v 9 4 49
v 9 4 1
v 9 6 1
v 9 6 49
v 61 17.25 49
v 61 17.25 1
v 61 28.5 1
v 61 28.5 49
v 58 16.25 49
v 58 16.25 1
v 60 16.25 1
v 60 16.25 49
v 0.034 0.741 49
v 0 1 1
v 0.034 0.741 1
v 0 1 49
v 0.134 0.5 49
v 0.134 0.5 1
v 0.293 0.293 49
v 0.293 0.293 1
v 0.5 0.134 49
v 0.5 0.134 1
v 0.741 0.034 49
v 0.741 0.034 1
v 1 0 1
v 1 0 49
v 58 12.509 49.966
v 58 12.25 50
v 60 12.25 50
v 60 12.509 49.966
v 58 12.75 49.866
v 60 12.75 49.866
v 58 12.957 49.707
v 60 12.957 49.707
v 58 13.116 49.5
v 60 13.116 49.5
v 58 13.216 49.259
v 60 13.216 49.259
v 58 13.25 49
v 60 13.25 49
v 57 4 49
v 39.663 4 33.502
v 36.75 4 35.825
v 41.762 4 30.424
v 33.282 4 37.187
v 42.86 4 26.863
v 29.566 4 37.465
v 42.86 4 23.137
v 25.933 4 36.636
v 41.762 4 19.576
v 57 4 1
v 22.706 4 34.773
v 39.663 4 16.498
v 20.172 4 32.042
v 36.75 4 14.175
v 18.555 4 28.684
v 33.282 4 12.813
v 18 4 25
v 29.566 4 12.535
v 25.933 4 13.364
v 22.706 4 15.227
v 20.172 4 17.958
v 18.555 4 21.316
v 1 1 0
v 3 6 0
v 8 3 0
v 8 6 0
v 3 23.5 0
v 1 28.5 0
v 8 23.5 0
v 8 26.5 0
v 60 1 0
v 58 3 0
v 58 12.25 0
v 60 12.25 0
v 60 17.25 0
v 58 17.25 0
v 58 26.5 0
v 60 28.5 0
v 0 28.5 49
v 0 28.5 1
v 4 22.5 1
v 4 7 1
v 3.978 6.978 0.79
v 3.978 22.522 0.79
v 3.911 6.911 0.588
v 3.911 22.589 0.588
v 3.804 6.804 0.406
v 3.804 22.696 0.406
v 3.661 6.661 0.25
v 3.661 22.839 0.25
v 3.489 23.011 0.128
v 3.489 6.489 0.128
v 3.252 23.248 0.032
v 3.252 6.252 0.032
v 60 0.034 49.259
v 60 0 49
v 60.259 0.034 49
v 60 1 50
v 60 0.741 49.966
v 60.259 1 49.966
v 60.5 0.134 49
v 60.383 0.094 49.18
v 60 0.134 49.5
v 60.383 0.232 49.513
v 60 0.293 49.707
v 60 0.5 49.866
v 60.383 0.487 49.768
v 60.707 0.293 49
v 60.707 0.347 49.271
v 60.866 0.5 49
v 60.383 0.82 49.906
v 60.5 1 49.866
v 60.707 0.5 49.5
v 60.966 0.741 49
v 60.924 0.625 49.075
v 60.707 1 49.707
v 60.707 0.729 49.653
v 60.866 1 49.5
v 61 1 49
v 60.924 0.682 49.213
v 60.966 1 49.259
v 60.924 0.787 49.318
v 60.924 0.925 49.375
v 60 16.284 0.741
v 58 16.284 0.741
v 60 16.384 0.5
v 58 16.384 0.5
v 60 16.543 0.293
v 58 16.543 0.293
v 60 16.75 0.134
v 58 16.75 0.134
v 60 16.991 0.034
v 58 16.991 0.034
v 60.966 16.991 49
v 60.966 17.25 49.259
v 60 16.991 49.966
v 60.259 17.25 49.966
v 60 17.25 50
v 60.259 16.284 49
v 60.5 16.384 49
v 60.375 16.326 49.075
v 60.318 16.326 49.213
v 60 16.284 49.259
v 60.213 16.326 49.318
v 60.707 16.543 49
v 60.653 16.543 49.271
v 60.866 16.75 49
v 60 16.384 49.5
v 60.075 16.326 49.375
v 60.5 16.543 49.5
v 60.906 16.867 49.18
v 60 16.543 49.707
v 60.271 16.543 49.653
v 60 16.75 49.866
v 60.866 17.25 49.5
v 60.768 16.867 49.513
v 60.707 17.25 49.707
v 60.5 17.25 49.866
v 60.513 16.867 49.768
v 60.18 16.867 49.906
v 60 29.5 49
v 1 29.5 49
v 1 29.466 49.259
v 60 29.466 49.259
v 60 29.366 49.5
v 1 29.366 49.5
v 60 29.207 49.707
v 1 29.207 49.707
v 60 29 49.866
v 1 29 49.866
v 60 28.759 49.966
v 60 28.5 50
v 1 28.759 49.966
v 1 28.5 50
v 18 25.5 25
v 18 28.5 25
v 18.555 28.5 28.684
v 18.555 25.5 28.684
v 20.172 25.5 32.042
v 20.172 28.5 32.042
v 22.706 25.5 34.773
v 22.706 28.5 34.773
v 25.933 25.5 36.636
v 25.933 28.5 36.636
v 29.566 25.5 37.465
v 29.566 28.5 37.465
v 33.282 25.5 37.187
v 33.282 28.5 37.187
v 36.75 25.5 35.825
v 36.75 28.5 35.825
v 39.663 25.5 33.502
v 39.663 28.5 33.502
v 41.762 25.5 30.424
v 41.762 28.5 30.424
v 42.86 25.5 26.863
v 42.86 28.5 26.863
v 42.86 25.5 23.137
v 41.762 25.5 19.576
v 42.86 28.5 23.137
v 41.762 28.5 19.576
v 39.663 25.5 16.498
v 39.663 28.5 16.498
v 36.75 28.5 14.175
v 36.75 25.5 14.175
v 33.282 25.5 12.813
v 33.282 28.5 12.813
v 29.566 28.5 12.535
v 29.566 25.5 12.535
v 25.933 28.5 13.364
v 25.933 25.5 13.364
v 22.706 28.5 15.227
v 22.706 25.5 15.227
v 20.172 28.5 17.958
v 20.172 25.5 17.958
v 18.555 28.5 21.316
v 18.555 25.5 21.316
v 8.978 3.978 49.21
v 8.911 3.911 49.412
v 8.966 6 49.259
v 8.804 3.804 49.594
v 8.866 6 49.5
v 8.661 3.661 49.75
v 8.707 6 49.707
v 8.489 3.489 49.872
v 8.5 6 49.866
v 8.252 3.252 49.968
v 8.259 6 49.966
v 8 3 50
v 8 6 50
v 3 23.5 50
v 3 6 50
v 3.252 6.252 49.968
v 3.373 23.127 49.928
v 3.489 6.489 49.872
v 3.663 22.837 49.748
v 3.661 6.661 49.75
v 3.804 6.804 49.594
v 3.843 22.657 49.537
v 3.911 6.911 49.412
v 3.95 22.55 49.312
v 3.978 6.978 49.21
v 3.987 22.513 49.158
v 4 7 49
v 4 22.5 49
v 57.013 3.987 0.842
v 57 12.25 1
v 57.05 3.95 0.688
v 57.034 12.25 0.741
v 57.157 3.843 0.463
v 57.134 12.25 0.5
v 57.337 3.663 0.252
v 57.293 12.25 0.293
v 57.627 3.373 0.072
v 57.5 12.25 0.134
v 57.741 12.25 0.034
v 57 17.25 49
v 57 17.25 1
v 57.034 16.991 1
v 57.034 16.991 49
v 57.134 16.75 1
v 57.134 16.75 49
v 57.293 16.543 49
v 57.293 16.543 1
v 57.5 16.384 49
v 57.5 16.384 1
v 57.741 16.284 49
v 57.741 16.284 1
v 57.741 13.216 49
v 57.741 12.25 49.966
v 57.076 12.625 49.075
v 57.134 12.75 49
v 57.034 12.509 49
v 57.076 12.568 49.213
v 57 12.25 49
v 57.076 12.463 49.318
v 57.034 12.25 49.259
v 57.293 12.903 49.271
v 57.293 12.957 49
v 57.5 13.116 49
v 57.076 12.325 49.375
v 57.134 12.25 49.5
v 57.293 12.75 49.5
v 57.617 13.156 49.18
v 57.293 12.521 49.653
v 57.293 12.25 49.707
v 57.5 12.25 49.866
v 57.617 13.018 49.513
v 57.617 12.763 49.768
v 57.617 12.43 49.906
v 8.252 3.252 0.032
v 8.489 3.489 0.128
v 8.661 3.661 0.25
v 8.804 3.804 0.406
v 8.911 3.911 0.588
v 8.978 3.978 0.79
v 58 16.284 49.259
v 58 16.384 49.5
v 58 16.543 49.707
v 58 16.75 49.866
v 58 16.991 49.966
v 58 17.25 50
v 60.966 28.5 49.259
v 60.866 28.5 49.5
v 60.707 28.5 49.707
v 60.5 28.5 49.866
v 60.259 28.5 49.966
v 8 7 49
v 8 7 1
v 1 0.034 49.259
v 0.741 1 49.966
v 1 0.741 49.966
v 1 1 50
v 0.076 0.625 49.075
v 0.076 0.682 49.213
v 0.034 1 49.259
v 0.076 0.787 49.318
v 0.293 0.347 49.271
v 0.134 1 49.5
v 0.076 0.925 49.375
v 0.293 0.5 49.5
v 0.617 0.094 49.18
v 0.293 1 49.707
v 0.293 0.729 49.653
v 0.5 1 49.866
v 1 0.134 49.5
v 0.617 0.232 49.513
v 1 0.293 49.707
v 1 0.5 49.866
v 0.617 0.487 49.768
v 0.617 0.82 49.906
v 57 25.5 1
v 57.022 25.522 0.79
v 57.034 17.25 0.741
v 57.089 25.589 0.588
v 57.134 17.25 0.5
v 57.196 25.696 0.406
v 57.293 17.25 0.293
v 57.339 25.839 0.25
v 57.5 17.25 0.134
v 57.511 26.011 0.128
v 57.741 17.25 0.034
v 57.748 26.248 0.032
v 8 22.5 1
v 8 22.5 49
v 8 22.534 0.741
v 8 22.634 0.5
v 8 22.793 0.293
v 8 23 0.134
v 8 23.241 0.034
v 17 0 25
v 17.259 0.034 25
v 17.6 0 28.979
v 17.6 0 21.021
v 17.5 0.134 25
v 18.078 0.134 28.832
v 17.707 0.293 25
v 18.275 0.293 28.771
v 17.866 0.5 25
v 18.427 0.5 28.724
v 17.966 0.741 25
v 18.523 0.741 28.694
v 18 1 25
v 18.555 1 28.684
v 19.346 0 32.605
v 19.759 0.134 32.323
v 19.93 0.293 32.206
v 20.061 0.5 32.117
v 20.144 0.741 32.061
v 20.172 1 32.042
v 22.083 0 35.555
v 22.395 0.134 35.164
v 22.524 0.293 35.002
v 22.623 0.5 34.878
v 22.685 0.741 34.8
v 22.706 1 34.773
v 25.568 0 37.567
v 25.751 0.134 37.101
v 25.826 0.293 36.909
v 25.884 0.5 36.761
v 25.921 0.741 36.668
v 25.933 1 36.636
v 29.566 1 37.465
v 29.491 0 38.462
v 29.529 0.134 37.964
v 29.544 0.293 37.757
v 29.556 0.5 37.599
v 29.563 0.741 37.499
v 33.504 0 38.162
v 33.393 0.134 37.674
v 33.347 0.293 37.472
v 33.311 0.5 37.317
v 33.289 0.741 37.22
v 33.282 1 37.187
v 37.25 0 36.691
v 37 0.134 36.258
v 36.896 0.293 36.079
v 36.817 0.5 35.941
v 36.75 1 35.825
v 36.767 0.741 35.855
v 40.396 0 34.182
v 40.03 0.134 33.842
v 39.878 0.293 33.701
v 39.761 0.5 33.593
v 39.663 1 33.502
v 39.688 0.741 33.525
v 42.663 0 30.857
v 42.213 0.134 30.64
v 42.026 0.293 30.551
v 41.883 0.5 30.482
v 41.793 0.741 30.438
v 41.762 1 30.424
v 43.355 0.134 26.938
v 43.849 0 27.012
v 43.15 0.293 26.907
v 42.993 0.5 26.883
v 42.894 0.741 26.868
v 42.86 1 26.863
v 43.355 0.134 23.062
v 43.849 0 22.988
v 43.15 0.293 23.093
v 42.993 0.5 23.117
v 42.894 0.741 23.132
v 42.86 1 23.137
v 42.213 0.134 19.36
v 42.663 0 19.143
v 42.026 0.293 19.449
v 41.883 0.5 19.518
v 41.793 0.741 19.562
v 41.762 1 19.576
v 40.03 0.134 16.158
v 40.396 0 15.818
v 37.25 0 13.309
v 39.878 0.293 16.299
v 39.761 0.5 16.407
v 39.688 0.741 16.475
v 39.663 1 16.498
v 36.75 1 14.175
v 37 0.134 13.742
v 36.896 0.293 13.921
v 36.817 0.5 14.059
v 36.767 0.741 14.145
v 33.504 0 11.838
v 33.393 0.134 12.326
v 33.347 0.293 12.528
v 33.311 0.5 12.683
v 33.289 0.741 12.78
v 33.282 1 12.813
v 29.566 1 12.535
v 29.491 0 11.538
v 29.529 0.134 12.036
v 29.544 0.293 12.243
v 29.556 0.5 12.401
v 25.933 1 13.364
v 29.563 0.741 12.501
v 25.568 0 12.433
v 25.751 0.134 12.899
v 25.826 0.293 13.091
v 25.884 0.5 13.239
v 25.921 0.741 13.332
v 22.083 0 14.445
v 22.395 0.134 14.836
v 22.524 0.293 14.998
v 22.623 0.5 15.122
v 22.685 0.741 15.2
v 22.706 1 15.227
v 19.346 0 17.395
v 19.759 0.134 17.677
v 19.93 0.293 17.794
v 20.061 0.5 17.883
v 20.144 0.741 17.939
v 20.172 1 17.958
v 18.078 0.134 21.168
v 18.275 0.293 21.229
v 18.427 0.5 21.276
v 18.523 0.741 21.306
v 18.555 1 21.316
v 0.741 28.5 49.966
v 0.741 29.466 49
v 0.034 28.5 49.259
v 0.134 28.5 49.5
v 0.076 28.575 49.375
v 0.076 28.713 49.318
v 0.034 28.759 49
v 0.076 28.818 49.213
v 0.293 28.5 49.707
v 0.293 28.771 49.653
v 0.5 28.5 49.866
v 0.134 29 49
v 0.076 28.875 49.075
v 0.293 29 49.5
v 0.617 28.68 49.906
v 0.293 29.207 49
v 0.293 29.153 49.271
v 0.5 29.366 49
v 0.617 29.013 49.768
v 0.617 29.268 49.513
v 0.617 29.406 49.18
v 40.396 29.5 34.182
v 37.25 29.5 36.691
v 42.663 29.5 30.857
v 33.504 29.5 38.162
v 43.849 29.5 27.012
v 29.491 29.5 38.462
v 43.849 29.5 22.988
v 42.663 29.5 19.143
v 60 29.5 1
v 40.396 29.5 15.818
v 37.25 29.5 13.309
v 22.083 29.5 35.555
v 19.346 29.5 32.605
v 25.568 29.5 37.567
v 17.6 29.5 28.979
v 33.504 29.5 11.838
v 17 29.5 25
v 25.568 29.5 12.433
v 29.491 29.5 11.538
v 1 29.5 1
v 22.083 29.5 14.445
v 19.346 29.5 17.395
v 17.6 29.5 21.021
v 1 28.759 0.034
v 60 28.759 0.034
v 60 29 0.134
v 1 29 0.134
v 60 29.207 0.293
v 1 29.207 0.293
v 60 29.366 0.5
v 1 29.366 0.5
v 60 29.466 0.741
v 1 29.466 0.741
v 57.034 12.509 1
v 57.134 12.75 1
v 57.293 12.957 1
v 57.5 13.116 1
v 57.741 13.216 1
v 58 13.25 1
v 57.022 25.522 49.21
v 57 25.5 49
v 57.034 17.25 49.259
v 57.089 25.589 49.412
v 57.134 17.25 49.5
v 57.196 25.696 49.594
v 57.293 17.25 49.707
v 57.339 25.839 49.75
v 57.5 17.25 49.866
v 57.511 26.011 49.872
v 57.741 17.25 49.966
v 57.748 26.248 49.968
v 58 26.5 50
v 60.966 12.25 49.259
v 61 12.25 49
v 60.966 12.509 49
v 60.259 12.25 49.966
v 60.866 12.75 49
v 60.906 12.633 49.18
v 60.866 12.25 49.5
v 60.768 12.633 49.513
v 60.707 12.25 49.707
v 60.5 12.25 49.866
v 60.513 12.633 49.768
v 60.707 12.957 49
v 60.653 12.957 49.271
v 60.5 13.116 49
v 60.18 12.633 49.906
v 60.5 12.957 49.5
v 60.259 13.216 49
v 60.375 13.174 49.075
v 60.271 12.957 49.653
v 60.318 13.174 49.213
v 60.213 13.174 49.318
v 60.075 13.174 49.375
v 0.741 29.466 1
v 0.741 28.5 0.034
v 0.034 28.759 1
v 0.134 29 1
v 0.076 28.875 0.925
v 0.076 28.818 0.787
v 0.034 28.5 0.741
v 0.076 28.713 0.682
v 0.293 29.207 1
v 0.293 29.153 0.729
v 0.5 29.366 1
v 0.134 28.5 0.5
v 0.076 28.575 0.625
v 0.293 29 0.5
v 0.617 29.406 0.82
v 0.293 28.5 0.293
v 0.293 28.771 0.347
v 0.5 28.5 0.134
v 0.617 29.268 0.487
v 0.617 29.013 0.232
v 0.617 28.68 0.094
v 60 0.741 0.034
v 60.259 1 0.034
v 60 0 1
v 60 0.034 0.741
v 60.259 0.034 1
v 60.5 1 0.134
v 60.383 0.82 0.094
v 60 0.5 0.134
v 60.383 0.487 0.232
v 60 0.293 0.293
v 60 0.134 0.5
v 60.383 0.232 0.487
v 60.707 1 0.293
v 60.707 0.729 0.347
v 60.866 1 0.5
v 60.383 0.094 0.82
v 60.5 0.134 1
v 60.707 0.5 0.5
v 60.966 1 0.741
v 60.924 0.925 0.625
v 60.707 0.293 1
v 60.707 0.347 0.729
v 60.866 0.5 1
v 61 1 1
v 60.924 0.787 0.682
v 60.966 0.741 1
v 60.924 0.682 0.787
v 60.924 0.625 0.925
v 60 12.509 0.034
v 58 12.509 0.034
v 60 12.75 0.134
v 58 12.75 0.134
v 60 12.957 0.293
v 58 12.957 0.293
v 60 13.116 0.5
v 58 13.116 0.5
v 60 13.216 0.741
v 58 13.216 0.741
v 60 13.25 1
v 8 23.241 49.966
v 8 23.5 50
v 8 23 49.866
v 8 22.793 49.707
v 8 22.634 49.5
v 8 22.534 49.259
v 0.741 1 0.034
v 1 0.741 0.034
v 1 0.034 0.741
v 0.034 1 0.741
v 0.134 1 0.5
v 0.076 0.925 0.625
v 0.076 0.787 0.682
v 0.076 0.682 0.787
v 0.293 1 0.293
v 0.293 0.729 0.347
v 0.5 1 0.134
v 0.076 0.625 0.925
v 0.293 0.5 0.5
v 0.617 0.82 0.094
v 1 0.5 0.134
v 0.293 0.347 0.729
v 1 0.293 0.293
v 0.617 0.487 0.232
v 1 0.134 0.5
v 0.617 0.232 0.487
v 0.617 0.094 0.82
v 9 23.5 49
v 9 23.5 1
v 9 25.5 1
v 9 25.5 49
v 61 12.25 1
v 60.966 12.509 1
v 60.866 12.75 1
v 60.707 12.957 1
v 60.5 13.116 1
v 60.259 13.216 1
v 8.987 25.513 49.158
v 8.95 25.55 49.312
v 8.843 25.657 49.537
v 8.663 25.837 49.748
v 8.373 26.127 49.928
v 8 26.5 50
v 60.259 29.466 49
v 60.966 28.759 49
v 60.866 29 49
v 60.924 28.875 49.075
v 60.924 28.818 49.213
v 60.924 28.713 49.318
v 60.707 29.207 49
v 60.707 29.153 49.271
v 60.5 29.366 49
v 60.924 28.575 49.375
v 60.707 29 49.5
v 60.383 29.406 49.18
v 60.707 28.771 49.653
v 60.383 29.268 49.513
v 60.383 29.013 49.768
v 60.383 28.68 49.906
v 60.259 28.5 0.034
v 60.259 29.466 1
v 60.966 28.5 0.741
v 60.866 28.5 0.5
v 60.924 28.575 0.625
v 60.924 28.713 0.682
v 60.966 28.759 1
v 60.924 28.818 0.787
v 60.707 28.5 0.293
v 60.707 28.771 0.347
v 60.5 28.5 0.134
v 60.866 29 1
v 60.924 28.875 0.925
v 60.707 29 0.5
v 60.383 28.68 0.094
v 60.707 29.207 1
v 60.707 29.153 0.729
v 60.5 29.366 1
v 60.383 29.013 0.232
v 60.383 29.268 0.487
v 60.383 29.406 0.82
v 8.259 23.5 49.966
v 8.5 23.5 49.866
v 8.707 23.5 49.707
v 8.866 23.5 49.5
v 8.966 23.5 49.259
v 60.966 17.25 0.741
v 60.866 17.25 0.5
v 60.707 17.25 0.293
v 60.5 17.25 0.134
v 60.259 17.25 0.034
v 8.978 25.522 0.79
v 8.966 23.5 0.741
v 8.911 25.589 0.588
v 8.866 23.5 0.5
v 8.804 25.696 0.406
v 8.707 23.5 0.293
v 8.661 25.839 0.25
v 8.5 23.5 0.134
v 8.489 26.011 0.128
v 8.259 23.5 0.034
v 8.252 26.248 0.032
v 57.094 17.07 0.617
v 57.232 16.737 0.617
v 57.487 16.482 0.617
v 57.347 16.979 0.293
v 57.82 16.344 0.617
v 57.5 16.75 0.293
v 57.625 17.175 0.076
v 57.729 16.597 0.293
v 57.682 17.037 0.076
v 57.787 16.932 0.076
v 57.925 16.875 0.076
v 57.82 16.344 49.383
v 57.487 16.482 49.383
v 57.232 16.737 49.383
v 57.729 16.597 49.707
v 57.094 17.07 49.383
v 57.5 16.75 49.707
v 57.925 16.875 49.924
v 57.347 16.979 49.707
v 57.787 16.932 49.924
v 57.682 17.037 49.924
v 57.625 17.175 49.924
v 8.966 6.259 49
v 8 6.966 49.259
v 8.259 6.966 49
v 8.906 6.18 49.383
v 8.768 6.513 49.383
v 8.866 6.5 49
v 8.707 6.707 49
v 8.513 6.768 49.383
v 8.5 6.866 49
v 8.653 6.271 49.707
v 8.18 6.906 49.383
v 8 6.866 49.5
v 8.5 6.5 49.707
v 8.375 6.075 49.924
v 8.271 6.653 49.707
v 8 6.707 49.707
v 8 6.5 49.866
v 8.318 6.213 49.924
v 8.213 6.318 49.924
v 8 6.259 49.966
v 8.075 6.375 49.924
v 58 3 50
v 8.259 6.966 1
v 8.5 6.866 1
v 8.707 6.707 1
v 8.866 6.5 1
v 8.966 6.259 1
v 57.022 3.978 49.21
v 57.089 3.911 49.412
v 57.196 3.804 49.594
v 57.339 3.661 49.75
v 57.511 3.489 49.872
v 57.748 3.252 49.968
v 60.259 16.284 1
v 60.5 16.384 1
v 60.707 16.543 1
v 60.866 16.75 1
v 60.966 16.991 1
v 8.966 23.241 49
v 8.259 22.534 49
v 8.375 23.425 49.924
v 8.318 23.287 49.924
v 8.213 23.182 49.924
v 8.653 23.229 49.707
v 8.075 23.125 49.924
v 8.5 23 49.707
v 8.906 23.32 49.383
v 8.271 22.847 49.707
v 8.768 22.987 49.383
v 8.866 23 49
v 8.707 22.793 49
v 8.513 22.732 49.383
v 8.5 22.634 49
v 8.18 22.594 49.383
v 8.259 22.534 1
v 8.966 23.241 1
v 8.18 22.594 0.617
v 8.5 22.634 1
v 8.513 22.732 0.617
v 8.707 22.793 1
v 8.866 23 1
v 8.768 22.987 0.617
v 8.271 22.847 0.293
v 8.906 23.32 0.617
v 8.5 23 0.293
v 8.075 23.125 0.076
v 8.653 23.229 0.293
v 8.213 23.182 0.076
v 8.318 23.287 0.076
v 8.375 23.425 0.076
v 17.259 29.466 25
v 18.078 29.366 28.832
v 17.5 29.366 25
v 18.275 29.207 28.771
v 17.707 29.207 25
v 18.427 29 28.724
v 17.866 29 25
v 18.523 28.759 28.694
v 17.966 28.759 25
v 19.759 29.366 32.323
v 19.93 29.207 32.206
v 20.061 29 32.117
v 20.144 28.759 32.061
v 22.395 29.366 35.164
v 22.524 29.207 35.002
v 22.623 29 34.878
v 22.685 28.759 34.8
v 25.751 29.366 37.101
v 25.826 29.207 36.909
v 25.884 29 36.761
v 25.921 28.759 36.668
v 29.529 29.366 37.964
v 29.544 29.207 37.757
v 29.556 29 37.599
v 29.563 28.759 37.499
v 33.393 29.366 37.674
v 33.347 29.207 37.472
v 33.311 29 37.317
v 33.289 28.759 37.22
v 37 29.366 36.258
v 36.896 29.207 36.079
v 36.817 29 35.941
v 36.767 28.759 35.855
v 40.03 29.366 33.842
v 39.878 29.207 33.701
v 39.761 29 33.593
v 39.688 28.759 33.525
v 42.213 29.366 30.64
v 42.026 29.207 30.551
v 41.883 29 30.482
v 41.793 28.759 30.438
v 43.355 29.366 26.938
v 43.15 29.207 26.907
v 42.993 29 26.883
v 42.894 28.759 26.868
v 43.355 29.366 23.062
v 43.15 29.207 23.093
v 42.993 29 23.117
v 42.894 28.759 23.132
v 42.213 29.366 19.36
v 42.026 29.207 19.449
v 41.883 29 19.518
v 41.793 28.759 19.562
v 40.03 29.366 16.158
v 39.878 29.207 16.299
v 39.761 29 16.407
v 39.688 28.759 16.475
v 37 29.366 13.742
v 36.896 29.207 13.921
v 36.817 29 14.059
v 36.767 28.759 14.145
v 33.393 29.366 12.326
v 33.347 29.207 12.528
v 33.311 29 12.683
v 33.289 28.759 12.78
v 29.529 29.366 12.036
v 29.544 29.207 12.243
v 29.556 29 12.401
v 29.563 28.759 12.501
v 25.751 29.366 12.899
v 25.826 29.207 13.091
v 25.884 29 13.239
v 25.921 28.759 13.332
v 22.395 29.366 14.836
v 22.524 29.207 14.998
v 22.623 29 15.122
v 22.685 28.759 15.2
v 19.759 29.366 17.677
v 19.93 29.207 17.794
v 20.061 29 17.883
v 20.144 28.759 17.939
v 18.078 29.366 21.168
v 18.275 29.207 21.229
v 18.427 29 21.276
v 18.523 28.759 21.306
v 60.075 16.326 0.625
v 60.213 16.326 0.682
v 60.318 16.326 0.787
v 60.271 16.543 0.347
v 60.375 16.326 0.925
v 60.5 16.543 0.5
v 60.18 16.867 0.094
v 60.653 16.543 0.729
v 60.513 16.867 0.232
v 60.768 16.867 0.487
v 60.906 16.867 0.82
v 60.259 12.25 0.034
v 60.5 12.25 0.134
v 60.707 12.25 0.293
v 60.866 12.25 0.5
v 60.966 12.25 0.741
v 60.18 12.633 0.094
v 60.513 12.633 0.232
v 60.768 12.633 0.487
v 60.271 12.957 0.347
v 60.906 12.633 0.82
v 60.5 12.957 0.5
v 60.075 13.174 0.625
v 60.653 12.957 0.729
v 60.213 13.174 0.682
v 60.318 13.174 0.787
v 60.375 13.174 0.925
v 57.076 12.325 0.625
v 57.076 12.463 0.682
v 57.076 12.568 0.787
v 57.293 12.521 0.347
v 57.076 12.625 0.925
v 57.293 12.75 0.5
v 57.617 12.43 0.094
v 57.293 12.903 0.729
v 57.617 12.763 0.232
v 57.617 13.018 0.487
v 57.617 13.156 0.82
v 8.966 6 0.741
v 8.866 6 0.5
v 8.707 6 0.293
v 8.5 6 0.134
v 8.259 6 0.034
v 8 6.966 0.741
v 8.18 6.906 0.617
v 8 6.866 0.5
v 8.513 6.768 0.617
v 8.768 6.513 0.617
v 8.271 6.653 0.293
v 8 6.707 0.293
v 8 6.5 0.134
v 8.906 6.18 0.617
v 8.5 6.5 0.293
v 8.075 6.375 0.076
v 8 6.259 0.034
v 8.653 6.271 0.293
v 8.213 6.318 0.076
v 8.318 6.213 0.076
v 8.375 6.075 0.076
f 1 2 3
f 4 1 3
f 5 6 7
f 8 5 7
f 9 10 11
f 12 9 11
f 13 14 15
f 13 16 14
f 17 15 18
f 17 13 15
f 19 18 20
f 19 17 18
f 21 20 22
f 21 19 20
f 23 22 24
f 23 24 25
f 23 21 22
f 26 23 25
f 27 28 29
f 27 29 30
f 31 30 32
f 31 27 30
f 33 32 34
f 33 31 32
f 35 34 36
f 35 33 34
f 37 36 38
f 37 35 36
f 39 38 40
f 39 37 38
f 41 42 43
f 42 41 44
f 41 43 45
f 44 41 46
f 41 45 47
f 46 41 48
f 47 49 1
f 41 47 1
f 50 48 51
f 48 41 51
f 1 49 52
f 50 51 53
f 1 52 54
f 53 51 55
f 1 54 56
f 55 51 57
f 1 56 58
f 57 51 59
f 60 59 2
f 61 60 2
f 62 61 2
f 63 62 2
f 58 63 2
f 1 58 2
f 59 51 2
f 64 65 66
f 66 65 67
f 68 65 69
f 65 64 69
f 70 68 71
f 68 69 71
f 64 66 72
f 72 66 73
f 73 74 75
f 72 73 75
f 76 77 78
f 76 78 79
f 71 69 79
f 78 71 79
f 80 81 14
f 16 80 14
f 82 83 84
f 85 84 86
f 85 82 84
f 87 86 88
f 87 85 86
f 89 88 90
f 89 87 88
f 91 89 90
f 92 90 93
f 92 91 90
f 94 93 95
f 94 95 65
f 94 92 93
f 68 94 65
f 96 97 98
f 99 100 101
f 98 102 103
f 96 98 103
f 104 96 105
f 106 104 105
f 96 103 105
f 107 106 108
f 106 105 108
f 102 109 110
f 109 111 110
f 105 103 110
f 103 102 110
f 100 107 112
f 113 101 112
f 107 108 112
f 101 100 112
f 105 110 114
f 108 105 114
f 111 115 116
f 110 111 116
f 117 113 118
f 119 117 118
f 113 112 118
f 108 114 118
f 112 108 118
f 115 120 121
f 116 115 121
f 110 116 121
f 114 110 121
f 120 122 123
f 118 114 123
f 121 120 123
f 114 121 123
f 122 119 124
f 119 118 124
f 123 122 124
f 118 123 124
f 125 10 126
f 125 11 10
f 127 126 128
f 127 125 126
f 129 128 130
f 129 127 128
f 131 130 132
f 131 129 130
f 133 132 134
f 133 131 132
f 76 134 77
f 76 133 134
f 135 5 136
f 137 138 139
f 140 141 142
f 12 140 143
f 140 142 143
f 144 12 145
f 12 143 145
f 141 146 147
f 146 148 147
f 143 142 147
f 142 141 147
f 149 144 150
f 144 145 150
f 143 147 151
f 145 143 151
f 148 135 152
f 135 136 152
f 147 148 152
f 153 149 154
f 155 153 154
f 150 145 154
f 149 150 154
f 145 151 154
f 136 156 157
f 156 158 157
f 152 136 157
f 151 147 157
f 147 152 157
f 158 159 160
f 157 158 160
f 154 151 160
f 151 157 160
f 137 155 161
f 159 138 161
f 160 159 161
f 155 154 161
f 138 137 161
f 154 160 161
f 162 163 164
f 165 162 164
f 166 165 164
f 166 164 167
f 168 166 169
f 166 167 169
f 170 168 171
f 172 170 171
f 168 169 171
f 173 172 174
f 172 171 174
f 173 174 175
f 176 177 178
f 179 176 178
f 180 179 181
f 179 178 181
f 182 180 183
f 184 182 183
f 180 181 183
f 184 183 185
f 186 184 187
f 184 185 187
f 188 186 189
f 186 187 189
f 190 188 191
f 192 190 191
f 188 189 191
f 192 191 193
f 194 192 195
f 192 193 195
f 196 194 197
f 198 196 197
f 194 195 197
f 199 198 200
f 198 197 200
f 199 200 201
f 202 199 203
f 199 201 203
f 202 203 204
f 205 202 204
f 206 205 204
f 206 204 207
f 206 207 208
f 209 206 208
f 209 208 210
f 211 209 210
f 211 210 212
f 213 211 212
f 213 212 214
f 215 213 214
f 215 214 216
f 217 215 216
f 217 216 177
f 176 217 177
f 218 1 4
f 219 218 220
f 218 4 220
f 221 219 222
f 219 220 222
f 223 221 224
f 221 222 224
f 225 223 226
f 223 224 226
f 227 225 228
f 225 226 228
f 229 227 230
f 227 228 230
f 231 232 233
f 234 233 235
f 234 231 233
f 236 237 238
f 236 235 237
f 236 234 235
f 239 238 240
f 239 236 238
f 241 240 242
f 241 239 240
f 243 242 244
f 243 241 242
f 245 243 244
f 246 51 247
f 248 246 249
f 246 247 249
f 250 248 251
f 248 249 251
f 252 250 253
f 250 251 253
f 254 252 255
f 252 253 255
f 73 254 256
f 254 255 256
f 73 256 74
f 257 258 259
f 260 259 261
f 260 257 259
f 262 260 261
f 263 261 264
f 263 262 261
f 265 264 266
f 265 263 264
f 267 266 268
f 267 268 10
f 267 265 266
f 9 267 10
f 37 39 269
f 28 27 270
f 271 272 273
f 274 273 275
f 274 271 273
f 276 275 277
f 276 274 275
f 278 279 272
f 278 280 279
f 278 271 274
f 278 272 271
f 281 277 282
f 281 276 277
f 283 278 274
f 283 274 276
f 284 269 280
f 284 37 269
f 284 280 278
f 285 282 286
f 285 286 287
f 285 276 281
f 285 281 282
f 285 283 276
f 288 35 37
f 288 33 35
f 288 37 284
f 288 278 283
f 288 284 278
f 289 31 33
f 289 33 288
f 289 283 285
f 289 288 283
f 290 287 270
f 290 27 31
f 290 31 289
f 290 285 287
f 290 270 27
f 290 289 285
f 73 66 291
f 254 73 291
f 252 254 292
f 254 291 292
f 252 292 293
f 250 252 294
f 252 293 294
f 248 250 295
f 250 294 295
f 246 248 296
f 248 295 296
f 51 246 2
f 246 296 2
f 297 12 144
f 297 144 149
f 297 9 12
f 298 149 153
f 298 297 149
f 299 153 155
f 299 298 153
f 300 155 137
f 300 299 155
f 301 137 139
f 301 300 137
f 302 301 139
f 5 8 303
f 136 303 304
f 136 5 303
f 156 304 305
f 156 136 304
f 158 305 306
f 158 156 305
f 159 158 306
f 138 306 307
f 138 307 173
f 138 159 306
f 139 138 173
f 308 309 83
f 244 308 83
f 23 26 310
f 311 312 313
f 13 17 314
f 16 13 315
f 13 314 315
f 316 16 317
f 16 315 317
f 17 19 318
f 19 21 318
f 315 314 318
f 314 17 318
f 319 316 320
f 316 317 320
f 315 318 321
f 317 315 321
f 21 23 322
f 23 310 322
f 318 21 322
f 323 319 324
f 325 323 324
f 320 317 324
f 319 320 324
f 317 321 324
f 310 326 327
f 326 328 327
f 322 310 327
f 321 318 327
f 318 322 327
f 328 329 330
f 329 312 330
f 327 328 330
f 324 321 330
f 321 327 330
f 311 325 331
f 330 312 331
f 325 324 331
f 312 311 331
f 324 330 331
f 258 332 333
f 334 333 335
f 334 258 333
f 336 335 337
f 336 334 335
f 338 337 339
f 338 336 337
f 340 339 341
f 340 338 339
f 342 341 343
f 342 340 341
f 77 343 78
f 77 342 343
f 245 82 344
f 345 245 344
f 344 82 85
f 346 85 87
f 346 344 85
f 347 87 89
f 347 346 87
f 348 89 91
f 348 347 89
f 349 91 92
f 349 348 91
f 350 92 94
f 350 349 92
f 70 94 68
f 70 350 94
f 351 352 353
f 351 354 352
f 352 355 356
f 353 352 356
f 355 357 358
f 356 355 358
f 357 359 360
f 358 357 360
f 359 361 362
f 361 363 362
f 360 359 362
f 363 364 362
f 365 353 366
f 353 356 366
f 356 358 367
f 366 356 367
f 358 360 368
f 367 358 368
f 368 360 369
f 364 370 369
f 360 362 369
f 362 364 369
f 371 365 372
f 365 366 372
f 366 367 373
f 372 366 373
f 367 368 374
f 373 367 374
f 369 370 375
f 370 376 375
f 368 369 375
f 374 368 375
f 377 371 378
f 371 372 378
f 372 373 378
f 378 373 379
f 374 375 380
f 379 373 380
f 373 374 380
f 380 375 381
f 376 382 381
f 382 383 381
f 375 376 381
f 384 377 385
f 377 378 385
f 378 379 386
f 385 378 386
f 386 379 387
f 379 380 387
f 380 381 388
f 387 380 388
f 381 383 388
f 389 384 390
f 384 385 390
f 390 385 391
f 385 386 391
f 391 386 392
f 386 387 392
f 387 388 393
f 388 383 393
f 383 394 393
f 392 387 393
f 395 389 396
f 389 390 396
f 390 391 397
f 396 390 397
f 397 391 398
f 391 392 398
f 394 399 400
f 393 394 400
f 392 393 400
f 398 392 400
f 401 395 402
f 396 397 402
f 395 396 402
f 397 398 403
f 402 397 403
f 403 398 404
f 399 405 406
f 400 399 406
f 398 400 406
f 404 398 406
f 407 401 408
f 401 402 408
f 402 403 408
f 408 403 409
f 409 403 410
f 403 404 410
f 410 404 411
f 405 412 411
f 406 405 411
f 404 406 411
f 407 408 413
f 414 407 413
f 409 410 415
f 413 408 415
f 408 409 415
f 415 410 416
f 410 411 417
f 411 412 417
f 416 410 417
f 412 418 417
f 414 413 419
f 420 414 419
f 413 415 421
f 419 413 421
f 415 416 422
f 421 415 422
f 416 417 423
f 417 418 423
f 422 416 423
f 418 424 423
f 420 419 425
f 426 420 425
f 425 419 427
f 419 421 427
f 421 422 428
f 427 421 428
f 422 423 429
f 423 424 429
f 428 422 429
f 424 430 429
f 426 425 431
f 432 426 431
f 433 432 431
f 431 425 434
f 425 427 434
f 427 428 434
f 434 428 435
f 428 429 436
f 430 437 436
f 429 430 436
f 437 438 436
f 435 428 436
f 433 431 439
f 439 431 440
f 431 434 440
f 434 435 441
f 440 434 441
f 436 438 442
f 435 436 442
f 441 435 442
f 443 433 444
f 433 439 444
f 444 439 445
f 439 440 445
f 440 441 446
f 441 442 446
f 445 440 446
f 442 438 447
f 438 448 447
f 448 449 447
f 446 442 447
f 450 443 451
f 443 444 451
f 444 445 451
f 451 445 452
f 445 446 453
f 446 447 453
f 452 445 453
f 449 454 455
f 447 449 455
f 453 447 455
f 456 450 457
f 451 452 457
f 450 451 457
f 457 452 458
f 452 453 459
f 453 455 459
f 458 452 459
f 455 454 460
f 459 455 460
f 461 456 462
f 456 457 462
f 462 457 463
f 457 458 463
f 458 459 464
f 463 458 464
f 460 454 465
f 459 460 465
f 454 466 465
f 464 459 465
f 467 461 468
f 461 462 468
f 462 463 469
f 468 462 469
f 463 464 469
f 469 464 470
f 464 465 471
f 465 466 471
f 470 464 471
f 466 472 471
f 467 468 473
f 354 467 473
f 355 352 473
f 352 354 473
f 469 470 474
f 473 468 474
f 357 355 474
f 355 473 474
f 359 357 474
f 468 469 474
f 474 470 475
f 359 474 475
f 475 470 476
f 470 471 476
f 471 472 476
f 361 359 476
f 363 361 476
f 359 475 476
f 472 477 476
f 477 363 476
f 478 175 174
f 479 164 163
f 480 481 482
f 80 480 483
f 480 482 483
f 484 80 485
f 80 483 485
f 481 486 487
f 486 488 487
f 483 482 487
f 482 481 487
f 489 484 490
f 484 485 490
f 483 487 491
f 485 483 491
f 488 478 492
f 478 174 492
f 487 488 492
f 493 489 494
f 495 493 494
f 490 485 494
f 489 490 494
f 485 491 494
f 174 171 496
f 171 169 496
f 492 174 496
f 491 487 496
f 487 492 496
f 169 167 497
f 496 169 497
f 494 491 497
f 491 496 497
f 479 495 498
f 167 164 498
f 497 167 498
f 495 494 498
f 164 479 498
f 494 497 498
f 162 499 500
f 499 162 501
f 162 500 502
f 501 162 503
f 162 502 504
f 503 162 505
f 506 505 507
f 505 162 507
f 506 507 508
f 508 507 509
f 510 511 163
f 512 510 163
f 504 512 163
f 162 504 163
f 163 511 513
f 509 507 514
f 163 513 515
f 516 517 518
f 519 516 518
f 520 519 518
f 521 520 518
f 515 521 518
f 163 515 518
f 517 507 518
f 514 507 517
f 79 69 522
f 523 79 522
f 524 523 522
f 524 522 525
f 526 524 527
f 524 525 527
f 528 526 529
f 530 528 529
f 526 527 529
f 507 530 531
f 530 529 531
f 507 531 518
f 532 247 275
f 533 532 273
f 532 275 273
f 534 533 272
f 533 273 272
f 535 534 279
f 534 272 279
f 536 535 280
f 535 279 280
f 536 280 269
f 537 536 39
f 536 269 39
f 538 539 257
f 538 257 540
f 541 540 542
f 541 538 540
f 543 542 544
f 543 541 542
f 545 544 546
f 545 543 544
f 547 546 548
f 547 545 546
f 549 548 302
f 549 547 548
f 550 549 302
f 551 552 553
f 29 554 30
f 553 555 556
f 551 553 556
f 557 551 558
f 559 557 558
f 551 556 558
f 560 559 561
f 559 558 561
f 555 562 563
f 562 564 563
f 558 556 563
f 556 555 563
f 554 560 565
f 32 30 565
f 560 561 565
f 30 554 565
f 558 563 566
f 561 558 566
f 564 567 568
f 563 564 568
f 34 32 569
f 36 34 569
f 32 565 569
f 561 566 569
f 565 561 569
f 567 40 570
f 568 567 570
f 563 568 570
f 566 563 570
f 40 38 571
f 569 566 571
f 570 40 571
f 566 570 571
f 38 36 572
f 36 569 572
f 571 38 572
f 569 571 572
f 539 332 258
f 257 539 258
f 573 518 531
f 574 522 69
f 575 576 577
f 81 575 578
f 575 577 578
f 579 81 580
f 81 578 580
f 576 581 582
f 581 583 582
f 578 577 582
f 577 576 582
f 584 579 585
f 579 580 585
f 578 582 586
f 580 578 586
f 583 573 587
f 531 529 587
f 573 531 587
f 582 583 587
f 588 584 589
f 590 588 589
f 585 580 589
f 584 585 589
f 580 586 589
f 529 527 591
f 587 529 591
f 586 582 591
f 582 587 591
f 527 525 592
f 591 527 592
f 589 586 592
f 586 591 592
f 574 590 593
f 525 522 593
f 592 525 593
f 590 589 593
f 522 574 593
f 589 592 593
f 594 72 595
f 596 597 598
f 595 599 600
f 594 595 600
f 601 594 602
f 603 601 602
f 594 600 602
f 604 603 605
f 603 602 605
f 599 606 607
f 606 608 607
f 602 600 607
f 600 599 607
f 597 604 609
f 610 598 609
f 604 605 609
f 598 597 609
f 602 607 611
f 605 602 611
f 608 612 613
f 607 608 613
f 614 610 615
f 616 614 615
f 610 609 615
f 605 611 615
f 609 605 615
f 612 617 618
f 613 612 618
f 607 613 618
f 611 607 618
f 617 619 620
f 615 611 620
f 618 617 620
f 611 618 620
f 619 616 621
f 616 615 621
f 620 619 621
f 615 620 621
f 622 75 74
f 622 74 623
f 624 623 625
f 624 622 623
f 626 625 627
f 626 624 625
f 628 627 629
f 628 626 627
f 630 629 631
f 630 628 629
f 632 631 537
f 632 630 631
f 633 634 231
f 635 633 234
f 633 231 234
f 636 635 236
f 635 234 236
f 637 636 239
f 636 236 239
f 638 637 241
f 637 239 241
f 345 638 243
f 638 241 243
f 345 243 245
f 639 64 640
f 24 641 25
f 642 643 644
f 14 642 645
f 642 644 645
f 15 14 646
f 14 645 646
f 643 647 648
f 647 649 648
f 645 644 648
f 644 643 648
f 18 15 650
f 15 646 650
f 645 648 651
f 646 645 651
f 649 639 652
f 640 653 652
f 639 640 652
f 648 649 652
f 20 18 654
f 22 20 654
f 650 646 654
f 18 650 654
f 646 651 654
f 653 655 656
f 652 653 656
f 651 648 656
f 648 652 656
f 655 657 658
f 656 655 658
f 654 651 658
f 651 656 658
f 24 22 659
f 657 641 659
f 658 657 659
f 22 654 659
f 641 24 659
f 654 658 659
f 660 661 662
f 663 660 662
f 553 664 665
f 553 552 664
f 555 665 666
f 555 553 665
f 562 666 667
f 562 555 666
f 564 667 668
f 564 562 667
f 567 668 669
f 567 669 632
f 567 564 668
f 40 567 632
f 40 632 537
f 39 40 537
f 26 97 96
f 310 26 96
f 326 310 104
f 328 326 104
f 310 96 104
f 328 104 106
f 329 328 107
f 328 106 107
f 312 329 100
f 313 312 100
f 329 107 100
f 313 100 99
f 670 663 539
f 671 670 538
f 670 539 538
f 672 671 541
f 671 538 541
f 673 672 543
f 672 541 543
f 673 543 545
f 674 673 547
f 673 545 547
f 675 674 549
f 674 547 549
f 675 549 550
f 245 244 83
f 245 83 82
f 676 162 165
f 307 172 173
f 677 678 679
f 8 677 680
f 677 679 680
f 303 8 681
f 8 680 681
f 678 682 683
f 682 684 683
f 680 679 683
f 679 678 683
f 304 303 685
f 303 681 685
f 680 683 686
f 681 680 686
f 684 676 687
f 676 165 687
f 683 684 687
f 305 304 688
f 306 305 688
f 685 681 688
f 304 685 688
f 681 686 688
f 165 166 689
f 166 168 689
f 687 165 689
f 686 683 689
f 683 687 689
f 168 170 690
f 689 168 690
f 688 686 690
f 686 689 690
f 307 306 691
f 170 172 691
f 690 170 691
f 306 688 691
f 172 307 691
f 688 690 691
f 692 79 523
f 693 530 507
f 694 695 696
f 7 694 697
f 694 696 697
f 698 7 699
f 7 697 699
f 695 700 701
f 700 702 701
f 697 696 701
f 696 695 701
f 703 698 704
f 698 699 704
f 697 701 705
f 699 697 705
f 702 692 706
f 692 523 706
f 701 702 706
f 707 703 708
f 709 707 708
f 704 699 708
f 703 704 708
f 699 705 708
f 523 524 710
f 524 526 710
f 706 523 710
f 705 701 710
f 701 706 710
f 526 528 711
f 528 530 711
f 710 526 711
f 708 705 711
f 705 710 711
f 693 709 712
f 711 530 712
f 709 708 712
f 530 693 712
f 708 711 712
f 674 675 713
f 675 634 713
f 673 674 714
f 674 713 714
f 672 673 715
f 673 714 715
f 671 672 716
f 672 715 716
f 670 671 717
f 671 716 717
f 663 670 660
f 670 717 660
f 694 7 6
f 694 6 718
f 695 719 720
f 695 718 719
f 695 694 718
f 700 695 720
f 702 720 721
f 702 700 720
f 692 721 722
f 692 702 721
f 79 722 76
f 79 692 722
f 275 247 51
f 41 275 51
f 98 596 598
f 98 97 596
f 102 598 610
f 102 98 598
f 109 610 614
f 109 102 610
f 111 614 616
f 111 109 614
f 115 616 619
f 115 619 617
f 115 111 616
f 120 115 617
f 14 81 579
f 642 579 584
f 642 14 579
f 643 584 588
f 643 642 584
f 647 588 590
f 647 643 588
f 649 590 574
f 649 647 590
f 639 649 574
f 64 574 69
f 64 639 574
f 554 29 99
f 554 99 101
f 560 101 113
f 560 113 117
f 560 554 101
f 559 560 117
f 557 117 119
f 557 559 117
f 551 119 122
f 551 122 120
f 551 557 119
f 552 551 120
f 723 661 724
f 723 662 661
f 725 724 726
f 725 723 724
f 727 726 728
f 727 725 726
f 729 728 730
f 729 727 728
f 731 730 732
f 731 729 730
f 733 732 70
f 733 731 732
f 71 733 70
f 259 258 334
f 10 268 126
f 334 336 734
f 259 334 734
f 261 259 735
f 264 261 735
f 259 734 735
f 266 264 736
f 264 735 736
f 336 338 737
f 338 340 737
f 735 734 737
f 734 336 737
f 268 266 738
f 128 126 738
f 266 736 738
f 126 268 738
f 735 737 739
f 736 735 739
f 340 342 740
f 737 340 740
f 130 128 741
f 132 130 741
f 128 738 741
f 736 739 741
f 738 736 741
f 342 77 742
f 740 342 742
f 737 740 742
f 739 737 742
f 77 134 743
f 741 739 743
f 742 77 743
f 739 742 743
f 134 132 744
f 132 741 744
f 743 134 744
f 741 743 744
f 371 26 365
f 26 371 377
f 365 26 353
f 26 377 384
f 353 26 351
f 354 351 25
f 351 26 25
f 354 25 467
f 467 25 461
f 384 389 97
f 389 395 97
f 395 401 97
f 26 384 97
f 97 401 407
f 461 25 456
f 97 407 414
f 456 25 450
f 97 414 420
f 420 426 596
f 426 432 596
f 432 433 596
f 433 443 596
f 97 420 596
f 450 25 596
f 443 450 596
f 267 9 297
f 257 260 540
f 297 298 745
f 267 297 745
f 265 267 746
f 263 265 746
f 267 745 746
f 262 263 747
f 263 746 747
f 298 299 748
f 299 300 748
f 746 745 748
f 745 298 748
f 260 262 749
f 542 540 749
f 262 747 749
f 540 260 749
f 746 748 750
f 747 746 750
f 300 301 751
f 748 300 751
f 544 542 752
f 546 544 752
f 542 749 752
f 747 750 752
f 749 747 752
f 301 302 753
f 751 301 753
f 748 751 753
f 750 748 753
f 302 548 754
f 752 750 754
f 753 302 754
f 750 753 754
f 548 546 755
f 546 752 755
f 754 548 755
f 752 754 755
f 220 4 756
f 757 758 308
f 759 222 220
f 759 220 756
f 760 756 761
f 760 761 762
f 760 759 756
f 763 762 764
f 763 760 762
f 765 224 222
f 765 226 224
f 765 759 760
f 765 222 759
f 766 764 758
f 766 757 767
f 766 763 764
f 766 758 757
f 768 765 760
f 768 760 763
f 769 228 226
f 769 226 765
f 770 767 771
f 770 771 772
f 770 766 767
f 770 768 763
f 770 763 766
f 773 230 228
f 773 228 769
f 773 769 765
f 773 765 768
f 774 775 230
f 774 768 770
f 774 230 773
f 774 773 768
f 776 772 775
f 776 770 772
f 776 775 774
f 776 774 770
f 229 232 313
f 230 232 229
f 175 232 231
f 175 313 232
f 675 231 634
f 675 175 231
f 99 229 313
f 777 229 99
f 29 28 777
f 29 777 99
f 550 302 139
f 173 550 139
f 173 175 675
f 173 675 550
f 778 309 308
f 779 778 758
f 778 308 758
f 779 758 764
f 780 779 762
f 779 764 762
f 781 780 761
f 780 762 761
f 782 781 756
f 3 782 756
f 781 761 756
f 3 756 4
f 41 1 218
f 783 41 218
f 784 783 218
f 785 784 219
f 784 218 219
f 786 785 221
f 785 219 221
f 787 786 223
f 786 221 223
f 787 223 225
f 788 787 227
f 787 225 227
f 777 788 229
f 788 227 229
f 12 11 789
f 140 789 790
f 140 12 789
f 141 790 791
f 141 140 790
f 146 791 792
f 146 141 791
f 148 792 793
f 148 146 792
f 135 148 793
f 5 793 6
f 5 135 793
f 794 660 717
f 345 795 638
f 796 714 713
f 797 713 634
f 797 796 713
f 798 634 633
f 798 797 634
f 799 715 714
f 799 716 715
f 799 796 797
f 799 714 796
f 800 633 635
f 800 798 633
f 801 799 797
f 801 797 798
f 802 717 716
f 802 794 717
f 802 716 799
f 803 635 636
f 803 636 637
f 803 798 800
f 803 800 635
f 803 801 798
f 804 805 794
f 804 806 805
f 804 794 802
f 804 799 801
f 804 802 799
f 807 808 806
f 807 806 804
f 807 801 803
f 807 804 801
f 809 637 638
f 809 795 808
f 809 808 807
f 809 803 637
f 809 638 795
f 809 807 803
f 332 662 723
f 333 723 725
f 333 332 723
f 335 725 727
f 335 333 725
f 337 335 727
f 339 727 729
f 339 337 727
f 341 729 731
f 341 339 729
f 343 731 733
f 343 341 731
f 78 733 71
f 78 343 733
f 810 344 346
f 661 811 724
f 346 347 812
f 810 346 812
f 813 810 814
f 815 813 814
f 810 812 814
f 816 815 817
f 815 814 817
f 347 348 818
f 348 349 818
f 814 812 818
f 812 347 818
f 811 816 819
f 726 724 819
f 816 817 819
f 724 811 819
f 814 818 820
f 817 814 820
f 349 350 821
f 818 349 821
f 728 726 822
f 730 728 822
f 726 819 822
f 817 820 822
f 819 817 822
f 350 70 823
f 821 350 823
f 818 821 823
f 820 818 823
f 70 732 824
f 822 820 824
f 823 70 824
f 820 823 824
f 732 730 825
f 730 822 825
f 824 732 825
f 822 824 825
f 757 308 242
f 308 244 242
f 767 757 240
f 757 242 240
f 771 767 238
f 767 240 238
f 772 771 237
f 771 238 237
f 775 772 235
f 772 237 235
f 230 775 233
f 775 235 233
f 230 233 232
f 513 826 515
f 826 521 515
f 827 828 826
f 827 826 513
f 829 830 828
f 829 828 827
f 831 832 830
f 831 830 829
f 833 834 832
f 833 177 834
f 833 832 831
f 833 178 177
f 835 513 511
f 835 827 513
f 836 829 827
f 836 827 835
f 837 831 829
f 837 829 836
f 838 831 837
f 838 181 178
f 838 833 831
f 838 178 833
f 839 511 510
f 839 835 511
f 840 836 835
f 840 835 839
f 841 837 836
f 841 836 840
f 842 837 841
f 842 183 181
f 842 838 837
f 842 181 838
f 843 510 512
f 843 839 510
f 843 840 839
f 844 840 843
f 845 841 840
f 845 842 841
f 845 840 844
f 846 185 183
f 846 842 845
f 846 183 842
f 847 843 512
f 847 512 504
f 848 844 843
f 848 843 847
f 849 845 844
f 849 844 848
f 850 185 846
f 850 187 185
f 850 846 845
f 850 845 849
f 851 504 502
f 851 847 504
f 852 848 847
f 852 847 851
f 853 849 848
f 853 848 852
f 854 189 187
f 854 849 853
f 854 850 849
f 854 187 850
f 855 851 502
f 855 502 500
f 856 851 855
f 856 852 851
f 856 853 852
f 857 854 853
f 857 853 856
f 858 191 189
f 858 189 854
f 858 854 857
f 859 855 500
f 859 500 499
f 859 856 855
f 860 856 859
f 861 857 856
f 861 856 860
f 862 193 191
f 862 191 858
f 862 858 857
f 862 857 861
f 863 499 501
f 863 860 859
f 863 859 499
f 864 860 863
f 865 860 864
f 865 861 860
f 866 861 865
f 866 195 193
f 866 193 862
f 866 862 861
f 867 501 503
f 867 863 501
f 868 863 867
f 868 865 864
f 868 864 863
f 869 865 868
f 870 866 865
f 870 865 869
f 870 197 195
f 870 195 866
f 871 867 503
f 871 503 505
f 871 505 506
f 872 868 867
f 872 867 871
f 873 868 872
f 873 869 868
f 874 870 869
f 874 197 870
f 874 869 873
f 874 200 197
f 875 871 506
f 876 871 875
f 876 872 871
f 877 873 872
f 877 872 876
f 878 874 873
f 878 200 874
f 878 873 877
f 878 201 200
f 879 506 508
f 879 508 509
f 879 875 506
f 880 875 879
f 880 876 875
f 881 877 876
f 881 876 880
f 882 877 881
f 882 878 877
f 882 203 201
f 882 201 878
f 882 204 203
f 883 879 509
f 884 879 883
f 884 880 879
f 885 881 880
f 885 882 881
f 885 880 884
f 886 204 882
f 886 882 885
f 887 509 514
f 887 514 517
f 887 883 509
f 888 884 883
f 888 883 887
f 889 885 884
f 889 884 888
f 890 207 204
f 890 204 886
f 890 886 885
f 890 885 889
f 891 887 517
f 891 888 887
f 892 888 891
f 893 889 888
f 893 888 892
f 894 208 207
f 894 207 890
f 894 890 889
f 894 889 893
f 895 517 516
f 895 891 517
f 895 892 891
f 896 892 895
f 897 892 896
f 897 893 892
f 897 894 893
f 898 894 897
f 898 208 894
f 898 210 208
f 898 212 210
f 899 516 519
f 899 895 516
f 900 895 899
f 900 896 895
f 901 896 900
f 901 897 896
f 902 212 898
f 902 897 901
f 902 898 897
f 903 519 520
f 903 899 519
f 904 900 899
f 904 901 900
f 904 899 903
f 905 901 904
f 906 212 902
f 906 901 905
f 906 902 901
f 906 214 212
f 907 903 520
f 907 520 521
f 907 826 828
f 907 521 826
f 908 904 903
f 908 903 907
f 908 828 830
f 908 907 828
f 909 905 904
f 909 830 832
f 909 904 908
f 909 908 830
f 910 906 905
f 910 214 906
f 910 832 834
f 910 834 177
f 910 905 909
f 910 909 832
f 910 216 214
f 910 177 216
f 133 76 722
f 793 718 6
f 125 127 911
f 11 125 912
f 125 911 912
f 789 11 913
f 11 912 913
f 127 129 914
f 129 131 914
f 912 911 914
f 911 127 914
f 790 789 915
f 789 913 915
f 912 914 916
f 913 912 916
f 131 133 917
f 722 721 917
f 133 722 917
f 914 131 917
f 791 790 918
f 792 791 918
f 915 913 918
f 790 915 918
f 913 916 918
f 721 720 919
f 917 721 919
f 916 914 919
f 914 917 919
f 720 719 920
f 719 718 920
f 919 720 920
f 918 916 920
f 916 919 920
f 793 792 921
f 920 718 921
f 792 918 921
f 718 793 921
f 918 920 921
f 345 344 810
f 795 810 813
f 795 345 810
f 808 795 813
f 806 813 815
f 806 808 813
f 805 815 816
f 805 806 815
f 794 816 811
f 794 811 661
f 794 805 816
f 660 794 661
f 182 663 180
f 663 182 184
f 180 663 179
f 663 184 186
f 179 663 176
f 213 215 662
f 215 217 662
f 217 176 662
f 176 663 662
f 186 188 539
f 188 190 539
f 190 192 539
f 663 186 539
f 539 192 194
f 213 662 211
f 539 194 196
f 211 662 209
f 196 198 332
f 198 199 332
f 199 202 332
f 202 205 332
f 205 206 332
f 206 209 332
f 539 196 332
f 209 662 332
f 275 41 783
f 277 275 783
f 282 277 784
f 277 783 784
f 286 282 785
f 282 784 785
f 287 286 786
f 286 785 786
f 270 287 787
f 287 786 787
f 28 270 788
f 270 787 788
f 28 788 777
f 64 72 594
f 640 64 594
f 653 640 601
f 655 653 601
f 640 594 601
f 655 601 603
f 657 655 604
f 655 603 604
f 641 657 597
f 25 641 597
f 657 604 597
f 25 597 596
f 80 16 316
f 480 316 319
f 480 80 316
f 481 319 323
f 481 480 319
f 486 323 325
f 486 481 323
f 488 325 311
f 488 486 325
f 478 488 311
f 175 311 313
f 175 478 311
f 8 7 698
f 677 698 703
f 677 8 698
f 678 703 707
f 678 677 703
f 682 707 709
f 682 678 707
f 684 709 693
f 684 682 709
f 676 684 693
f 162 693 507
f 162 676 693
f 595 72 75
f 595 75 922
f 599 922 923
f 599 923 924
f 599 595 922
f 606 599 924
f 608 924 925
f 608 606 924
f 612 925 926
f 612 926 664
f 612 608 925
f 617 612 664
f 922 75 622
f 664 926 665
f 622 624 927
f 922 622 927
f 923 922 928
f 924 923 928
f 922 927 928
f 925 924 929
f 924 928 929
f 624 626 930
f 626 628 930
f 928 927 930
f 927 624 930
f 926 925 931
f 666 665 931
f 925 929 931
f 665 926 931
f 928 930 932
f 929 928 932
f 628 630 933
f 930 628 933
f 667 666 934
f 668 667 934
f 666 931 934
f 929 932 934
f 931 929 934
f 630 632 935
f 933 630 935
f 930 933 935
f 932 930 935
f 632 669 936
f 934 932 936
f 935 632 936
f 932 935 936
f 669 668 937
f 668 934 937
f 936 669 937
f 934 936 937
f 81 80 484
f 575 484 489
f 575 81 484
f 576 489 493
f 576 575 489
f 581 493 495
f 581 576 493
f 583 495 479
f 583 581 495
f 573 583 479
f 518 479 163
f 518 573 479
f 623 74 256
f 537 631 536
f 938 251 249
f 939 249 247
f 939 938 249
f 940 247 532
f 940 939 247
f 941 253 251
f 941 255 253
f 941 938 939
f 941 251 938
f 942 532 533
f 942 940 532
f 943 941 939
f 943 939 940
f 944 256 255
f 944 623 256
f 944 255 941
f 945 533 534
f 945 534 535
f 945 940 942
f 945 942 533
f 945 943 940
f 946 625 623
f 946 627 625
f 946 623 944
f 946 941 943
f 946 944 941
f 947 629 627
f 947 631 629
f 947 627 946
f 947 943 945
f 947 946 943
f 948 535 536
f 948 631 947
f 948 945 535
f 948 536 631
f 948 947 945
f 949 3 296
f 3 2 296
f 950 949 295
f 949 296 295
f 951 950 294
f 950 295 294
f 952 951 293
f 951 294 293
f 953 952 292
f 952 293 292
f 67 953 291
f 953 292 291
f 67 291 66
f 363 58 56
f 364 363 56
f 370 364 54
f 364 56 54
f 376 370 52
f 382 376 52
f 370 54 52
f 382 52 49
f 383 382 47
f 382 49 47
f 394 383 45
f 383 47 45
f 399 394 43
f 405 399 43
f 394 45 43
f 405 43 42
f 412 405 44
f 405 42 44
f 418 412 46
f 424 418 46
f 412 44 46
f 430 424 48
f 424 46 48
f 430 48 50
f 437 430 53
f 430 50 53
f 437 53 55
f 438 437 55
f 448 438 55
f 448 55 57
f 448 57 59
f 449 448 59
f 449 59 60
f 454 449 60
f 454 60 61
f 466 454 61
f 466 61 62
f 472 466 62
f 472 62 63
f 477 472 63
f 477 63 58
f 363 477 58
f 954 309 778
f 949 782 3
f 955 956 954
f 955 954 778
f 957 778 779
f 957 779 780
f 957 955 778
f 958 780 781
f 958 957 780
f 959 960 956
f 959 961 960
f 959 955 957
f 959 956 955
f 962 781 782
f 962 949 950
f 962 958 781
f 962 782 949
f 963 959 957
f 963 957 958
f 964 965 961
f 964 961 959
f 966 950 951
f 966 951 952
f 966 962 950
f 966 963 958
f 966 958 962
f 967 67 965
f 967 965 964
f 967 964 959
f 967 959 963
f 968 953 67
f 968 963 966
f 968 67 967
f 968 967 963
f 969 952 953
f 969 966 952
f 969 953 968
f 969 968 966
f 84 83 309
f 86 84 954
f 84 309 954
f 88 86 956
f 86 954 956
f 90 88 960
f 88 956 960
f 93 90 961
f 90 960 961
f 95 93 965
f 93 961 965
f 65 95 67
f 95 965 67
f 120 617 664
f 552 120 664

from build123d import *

# Parameters (mm, degrees)
F1_DEPTH = 50
F2_R     = 12.5
F3_DEPTH = 29.501
F6_F1_R  = 1
F6_F2_R  = 1
F6_F3_R  = 1
F6_F4_R  = 1
F6_F5_R  = 1
F6_F6_R  = 1
F6_F7_R  = 1
F6_F8_R  = 1
F6_F9_R  = 1
F6_F10_R = 1
F6_F11_R = 1
F6_F12_R = 1
F6_F13_R = 1
F6_F14_R = 1
F6_F15_R = 1
F6_F16_R = 1
F6_F17_R = 1
F6_F18_R = 1
F6_F19_R = 1
F6_F20_R = 1
F6_F21_R = 1
F6_F22_R = 1
F6_F23_R = 1
F6_F24_R = 1
F6_F25_R = 1


# Not quite as in the source:
# - a feature of the source that left no trace in its solid (it failed there, or was rolled back) is left out


with BuildPart() as f1:
    # F0 (on Top) → F1 (new body)
    with BuildSketch(Plane.XY):
        Polygon((0, 0), (61, 0), (61, 13.25), (57, 13.25), (57, 4), (9, 4), (9, 7), (4, 7), (4, 22.5), (9, 22.5), (9, 25.5), (57, 25.5), (57, 16.25), (61, 16.25), (61, 29.5), (0, 29.5), align=None)
    extrude(amount=F1_DEPTH)

    # F2 (on face) → F3 (cut, through all)
    with BuildSketch(Plane(origin=(0, 29.5, 0), x_dir=(-1, 0, 0), z_dir=(0, 1, 0))):
        with Locations((-30.5, 25)):
            Circle(F2_R)
    extrude(amount=-F3_DEPTH, mode=Mode.SUBTRACT)

    # F6: fillet of radius 1 on 36 edges, made by hand

    # F6_f1
    f6_f1_edges = [f1.edges().sort_by_distance(p)[0] for p in [
        (43, 0, 25),
    ]]
    fillet(f6_f1_edges, radius=F6_F1_R)

    # F6_f2
    f6_f2_edges = [f1.edges().sort_by_distance(p)[0] for p in [
        (43, 29.5, 25),
    ]]
    fillet(f6_f2_edges, radius=F6_F2_R)

    # F6_f3
    f6_f3_edges = [f1.edges().sort_by_distance(p)[0] for p in [
        (30.5, 0, 0),
    ]]
    fillet(f6_f3_edges, radius=F6_F3_R)

    # F6_f4
    f6_f4_edges = [f1.edges().sort_by_distance(p)[0] for p in [
        (30.5, 0, 50),
    ]]
    fillet(f6_f4_edges, radius=F6_F4_R)

    # F6_f5
    f6_f5_edges = [f1.edges().sort_by_distance(p)[0] for p in [
        (30.5, 29.5, 0),
    ]]
    fillet(f6_f5_edges, radius=F6_F5_R)

    # F6_f6
    f6_f6_edges = [f1.edges().sort_by_distance(p)[0] for p in [
        (30.5, 29.5, 50),
    ]]
    fillet(f6_f6_edges, radius=F6_F6_R)

    # F6_f7
    f6_f7_edges = [f1.edges().sort_by_distance(p)[0] for p in [
        (0, 0, 25),
    ]]
    fillet(f6_f7_edges, radius=F6_F7_R)

    # F6_f8
    f6_f8_edges = [f1.edges().sort_by_distance(p)[0] for p in [
        (61, 0, 25),
    ]]
    fillet(f6_f8_edges, radius=F6_F8_R)

    # F6_f9
    f6_f9_edges = [f1.edges().sort_by_distance(p)[0] for p in [
        (61, 13.25, 25),
    ]]
    fillet(f6_f9_edges, radius=F6_F9_R)

    # F6_f10
    f6_f10_edges = [f1.edges().sort_by_distance(p)[0] for p in [
        (61, 29.5, 25),
    ]]
    fillet(f6_f10_edges, radius=F6_F10_R)

    # F6_f11
    f6_f11_edges = [f1.edges().sort_by_distance(p)[0] for p in [
        (57, 13.25, 25),
    ]]
    fillet(f6_f11_edges, radius=F6_F11_R)

    # F6_f12
    f6_f12_edges = [f1.edges().sort_by_distance(p)[0] for p in [
        (9, 7, 25),
    ]]
    fillet(f6_f12_edges, radius=F6_F12_R)

    # F6_f13
    f6_f13_edges = [f1.edges().sort_by_distance(p)[0] for p in [
        (9, 22.5, 25),
    ]]
    fillet(f6_f13_edges, radius=F6_F13_R)

    # F6_f14
    f6_f14_edges = [f1.edges().sort_by_distance(p)[0] for p in [
        (57, 16.25, 25),
    ]]
    fillet(f6_f14_edges, radius=F6_F14_R)

    # F6_f15
    f6_f15_edges = [f1.edges().sort_by_distance(p)[0] for p in [
        (61, 16.25, 25),
    ]]
    fillet(f6_f15_edges, radius=F6_F15_R)

    # F6_f16
    f6_f16_edges = [f1.edges().sort_by_distance(p)[0] for p in [
        (33, 4, 0),
    ]]
    fillet(f6_f16_edges, radius=F6_F16_R)

    # F6_f17
    f6_f17_edges = [f1.edges().sort_by_distance(p)[0] for p in [
        (33, 25.5, 0),
    ]]
    fillet(f6_f17_edges, radius=F6_F17_R)

    # F6_f18
    f6_f18_edges = [f1.edges().sort_by_distance(p)[0] for p in [
        (33, 4, 50),
    ]]
    fillet(f6_f18_edges, radius=F6_F18_R)

    # F6_f19
    f6_f19_edges = [f1.edges().sort_by_distance(p)[0] for p in [
        (33, 25.5, 50),
    ]]
    fillet(f6_f19_edges, radius=F6_F19_R)

    # F6_f20
    f6_f20_edges = [f1.edges().sort_by_distance(p)[0] for p in [
        (4, 14.75, 0),
    ]]
    fillet(f6_f20_edges, radius=F6_F20_R)

    # F6_f21
    f6_f21_edges = [f1.edges().sort_by_distance(p)[0] for p in [
        (4, 14.75, 50),
    ]]
    fillet(f6_f21_edges, radius=F6_F21_R)

    # F6_f22
    f6_f22_edges = [f1.edges().sort_by_distance(p)[0] for p in [
        (6, 7, 0),
    ]]
    fillet(f6_f22_edges, radius=F6_F22_R)

    # F6_f23
    f6_f23_edges = [f1.edges().sort_by_distance(p)[0] for p in [
        (6, 22.5, 0),
    ]]
    fillet(f6_f23_edges, radius=F6_F23_R)

    # F6_f24
    f6_f24_edges = [f1.edges().sort_by_distance(p)[0] for p in [
        (6, 7, 50),
    ]]
    fillet(f6_f24_edges, radius=F6_F24_R)

    # F6_f25
    f6_f25_edges = [f1.edges().sort_by_distance(p)[0] for p in [
        (6, 22.5, 50),
    ]]
    fillet(f6_f25_edges, radius=F6_F25_R)


solid = f1.part
